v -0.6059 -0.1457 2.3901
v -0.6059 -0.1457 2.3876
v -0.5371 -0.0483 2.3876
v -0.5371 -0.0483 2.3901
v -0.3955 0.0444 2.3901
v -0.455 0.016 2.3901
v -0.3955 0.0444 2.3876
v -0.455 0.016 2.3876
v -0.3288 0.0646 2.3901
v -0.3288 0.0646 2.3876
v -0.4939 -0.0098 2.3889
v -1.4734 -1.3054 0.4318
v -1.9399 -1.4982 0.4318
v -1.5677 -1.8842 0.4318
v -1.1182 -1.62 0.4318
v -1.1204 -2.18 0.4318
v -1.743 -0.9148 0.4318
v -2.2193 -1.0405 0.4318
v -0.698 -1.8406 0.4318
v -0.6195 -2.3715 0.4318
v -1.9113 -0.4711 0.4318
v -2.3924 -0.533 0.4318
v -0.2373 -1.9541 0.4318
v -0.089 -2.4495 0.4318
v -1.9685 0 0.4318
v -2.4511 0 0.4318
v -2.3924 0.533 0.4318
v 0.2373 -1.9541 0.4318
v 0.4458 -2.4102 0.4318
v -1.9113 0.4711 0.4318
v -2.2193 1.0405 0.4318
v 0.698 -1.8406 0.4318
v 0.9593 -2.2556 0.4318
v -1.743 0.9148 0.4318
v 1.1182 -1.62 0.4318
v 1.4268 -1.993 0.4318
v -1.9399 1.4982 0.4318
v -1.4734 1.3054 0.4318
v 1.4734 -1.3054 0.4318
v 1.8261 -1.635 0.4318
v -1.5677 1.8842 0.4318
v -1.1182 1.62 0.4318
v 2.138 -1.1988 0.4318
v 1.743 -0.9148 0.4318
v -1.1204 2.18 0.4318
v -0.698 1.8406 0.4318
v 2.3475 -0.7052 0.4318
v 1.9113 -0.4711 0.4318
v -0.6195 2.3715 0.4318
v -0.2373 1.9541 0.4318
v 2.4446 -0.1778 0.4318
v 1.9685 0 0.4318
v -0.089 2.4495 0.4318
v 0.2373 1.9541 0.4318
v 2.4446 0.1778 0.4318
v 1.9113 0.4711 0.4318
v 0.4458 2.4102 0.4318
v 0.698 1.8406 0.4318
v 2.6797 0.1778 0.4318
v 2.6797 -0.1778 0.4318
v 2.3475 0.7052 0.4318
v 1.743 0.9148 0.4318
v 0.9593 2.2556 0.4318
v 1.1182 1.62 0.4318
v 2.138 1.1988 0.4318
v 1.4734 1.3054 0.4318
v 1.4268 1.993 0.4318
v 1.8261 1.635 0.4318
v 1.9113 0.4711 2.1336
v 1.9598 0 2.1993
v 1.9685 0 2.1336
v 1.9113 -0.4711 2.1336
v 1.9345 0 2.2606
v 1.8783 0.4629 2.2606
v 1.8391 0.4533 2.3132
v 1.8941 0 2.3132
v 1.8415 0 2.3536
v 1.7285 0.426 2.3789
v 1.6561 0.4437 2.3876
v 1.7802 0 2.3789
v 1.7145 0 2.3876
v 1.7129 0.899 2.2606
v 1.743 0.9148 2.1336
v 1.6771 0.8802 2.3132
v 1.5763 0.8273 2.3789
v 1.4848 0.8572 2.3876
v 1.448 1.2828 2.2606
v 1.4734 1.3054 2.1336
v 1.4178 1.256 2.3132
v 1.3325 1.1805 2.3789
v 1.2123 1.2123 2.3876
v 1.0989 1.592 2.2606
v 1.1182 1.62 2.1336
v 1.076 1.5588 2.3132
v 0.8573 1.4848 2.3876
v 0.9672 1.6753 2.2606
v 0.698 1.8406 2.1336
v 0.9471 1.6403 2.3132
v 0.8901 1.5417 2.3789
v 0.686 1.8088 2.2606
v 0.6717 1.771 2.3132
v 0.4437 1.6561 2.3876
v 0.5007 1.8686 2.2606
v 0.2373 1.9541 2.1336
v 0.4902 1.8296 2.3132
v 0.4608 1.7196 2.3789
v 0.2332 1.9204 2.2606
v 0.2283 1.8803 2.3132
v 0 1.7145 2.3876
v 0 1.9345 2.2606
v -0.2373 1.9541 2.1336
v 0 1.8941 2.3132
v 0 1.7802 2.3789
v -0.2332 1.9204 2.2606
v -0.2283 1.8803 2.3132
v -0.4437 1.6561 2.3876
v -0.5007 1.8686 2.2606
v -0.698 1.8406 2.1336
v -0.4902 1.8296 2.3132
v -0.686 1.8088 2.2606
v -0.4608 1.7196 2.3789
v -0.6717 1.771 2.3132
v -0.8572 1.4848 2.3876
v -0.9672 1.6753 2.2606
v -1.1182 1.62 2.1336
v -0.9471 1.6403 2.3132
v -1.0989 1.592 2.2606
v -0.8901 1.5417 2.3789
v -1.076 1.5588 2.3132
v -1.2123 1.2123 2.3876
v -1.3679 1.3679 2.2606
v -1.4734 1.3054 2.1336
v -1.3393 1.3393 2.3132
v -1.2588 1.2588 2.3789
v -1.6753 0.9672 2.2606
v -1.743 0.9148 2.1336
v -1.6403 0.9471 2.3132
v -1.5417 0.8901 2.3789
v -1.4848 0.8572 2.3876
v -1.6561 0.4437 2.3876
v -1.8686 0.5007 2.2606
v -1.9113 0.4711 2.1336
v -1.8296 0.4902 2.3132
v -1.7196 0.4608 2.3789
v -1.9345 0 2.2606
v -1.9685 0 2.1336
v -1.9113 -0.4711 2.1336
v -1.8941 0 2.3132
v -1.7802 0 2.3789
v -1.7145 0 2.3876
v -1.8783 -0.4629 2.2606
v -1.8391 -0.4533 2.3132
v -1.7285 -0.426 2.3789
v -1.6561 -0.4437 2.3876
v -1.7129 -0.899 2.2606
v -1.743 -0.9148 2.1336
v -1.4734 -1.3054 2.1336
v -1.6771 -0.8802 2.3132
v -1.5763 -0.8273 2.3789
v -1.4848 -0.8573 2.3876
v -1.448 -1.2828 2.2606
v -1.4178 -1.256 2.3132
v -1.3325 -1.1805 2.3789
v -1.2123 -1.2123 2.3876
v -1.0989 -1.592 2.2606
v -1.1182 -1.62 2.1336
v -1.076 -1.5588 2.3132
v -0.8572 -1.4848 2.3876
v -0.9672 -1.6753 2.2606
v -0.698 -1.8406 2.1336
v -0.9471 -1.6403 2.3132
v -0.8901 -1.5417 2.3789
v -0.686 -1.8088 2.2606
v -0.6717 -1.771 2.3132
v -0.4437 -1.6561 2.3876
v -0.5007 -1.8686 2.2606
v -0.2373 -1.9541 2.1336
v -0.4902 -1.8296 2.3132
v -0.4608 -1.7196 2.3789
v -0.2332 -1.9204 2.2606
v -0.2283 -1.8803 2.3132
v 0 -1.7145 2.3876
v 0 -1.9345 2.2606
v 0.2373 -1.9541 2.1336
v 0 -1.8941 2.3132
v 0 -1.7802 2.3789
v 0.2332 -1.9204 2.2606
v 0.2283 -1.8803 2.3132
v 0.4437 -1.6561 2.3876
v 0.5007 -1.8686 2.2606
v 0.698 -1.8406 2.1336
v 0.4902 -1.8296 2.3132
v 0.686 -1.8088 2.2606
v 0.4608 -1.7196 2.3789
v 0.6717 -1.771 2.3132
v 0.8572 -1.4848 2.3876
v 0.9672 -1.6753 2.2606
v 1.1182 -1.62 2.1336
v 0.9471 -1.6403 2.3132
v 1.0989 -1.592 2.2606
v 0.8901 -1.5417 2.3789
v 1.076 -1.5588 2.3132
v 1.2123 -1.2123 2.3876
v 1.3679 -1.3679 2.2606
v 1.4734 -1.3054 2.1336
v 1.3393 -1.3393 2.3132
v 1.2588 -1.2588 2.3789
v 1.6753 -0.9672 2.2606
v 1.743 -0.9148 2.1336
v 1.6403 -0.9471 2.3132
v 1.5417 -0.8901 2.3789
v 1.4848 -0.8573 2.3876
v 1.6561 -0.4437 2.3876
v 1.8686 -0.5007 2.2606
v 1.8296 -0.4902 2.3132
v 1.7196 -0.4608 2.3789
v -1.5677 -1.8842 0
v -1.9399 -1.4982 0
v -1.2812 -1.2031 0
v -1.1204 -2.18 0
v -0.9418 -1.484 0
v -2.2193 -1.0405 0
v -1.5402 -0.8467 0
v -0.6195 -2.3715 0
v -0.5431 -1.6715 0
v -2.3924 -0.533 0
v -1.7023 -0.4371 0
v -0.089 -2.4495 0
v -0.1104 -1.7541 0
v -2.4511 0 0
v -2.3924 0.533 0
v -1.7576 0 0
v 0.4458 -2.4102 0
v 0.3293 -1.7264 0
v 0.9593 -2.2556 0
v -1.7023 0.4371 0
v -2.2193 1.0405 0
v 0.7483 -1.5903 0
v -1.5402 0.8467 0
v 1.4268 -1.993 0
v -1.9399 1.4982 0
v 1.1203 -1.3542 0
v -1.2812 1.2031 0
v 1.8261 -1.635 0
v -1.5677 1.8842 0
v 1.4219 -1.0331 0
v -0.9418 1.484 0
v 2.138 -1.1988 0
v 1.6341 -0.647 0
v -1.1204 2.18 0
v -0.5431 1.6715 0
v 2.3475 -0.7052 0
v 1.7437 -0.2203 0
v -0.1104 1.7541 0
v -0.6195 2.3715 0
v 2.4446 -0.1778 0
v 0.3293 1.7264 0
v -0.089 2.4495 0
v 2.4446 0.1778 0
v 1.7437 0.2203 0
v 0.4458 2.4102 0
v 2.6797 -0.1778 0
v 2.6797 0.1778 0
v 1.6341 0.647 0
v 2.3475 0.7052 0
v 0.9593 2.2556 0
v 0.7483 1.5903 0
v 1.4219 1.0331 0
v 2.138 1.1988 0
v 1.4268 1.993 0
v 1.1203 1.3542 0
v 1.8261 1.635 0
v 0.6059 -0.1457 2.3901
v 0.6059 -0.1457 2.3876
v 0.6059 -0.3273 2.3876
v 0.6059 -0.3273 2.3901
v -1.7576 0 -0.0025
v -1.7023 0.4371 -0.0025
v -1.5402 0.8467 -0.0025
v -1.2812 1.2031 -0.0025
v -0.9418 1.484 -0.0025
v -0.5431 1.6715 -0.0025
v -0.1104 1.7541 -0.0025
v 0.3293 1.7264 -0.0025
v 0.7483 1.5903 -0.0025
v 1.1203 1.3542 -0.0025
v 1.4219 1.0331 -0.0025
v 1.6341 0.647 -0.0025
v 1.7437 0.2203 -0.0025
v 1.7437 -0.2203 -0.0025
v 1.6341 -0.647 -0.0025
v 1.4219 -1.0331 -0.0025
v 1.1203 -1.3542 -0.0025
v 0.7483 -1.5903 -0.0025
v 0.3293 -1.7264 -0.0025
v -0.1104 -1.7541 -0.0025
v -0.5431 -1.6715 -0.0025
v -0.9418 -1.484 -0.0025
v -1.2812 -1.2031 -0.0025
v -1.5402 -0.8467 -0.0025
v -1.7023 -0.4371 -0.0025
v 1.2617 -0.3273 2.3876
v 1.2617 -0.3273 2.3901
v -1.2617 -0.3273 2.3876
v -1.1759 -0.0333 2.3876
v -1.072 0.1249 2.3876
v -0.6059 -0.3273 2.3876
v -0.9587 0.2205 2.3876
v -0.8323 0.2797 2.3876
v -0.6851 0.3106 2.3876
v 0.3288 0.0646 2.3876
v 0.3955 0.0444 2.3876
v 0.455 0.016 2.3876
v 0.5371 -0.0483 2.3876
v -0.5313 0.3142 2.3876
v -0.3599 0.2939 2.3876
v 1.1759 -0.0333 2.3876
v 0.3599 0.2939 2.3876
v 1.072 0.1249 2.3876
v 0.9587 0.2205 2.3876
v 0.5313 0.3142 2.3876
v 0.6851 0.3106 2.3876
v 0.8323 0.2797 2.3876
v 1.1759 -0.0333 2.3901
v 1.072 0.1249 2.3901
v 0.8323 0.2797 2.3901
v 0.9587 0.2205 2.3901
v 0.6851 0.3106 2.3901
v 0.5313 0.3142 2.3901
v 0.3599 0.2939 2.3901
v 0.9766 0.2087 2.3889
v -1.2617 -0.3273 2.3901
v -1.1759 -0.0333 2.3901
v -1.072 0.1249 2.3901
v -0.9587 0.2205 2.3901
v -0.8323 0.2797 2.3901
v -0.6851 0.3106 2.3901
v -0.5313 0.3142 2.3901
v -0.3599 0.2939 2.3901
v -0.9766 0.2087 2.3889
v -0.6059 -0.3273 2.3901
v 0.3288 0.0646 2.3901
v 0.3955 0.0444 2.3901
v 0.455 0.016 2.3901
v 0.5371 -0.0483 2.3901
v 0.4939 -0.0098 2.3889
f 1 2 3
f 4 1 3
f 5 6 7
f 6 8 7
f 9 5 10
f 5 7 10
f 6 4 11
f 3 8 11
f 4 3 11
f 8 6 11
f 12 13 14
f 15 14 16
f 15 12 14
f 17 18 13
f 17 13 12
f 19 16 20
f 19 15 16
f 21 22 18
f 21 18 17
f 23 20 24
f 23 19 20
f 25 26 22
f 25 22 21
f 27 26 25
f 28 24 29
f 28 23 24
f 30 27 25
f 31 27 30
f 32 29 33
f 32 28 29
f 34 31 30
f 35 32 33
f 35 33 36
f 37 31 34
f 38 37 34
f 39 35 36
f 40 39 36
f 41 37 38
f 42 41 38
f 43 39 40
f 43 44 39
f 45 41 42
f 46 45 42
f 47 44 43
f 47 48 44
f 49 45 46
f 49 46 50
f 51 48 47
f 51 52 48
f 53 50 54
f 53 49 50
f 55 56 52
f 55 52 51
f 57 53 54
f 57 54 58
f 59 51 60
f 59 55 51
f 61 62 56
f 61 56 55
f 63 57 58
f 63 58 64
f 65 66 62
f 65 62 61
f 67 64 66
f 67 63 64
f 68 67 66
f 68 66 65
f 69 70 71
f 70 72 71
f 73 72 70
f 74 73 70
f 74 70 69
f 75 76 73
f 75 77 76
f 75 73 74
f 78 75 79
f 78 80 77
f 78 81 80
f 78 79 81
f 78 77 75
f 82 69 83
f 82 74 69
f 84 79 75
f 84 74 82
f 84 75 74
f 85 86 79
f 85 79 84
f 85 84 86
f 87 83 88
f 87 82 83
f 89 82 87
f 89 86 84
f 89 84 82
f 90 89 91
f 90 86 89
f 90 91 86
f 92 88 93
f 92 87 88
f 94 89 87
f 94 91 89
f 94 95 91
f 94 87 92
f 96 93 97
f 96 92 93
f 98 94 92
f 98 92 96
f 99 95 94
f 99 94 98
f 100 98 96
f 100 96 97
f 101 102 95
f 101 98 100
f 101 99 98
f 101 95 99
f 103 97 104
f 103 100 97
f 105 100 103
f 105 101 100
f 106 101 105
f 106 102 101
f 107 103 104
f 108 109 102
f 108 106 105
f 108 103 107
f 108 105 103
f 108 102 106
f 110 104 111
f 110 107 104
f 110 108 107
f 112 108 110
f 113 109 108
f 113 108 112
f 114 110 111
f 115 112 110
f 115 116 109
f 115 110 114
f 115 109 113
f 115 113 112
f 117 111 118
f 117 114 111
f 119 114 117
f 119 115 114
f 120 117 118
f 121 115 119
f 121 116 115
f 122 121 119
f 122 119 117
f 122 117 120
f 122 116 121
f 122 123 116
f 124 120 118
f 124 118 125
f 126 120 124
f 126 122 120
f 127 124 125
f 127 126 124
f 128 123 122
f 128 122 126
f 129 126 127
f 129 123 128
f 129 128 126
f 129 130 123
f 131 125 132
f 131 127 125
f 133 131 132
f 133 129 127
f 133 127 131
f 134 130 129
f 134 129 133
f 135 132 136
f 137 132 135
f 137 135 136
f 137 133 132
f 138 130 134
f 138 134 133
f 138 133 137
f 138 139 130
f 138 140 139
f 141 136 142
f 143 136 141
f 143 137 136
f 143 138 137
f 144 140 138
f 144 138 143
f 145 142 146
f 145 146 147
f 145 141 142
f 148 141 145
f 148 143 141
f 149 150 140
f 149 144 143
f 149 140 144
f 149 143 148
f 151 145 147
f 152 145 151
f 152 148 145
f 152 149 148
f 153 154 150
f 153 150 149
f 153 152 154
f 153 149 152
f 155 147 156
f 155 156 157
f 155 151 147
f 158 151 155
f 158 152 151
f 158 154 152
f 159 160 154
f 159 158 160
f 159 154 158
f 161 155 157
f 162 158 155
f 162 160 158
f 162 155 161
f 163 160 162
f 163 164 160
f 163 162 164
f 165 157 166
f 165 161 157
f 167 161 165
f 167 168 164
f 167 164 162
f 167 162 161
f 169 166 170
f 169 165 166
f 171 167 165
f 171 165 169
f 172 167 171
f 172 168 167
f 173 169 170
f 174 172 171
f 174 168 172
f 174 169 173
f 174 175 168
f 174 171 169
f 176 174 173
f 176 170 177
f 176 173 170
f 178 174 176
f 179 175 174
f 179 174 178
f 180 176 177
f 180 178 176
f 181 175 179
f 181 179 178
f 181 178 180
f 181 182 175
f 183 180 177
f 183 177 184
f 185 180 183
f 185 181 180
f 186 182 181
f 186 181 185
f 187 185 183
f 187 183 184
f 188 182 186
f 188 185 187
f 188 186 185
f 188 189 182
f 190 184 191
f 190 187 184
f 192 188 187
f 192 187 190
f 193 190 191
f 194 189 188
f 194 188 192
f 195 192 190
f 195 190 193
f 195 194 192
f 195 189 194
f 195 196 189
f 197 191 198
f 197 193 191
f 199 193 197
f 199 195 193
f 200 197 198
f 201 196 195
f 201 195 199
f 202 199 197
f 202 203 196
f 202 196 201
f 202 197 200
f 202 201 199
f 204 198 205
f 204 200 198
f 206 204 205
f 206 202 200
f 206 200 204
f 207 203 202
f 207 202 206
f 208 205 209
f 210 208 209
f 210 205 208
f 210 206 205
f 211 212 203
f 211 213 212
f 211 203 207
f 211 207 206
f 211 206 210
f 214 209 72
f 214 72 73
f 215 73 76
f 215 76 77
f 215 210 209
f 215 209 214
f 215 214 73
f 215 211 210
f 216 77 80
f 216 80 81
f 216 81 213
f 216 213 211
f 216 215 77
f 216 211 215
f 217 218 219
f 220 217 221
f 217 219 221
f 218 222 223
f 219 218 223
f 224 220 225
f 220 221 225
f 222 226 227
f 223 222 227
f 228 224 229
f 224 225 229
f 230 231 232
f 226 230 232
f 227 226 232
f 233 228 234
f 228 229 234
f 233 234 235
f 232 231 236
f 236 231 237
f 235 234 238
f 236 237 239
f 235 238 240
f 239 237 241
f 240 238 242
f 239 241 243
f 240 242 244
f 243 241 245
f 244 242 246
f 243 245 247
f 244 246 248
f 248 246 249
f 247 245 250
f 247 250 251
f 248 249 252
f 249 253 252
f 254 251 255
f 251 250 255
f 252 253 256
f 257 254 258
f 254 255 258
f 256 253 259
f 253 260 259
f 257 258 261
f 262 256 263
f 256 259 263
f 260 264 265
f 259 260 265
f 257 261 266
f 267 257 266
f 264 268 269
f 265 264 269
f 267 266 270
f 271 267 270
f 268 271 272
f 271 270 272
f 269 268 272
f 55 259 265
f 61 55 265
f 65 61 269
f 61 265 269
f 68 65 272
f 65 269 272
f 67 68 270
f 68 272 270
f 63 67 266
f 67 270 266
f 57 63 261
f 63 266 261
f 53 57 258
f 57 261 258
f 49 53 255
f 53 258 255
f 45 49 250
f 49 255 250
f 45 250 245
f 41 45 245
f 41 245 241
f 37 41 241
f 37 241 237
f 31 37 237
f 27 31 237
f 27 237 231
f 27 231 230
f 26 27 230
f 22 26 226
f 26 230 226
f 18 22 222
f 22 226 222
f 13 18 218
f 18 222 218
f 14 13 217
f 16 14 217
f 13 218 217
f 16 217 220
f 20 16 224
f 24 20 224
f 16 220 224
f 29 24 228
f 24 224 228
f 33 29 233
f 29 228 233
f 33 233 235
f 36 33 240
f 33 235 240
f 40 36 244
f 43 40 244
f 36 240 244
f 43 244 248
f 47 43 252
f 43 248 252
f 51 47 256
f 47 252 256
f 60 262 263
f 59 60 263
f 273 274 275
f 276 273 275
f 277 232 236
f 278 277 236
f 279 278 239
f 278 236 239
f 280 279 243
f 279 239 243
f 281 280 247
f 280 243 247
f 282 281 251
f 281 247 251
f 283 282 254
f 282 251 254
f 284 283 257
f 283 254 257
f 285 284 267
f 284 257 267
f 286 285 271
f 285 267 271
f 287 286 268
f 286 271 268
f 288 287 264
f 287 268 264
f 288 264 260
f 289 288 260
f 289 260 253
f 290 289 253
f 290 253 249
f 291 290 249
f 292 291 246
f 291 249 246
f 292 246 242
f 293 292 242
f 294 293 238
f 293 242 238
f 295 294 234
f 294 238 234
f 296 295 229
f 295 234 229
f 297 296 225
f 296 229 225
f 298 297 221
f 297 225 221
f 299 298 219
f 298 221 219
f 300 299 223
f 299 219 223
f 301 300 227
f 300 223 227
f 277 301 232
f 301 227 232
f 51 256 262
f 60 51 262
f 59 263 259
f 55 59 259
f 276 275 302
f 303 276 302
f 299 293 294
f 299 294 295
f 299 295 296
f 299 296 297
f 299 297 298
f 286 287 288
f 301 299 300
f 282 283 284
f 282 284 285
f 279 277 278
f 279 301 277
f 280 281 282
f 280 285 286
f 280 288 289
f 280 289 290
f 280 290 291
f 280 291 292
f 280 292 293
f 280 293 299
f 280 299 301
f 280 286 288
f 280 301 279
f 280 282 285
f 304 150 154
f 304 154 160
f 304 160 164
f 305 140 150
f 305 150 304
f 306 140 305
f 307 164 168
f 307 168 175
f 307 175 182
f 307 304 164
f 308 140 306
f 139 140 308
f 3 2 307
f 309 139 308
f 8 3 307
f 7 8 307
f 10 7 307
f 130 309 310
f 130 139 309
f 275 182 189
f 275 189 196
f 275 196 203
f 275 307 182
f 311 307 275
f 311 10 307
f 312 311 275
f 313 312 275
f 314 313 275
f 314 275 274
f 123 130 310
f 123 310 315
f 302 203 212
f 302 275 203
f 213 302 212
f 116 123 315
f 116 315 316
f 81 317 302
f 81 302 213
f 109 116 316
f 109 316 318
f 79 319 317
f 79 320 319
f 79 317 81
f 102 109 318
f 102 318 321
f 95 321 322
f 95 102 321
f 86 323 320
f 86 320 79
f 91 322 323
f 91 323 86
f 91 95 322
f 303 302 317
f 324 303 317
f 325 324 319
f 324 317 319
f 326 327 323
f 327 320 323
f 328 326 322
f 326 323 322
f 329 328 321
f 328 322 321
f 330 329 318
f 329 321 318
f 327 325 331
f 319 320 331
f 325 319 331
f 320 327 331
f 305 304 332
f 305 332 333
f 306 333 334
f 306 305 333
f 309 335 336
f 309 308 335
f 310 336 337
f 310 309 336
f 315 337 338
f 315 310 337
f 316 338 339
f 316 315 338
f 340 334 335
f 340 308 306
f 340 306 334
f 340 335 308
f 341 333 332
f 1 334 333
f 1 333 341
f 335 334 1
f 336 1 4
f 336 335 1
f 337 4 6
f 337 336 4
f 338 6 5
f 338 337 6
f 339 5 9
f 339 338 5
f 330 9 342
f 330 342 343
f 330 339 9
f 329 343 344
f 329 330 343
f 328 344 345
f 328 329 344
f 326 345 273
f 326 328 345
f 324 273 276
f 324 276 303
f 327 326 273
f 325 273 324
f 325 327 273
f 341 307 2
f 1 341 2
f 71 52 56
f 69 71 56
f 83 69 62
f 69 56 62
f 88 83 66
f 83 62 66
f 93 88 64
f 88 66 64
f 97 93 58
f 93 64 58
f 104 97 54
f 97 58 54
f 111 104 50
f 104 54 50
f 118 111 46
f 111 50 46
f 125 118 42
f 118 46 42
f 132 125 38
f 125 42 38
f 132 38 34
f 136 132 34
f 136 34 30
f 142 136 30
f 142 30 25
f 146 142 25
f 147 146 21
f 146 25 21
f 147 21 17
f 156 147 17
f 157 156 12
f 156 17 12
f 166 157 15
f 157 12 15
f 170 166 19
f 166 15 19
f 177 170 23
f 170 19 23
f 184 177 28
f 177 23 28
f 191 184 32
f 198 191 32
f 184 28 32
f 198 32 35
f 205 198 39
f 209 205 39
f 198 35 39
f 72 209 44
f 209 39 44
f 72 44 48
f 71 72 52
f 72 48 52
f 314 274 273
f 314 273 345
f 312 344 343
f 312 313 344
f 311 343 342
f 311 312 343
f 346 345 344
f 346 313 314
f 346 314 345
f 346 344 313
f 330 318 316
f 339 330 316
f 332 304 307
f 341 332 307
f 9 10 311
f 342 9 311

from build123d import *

# Parameters (mm, degrees)
BOSS_EXTRUDE1_DEPTH = 0.4318
SKETCH2_R           = 1.9685
BOSS_EXTRUDE2_DEPTH = 1.9558
SKETCH3_R           = 1.757566481
BOSS_EXTRUDE3_DEPTH = 0.00254
FILLET1_R           = 0.254
BOSS_EXTRUDE6_DEPTH = 0.00254


with BuildPart() as part:
    # Sketch1 → Boss-Extrude1 (new body)
    with BuildSketch(Plane.XY):
        with BuildLine():
            Line((2.6797, 0.1778), (2.4511, 0.1778))
            Line((2.4511, 0.1778), (2.44464279, 0.1778))
            ThreePointArc((2.44464279, 0.1778), (-2.4511, 0), (2.44464279, -0.1778))
            Line((2.44464279, -0.1778), (2.4511, -0.1778))
            Line((2.4511, -0.1778), (2.6797, -0.1778))
            Line((2.6797, -0.1778), (2.6797, 0.1778))
        make_face()
    extrude(amount=BOSS_EXTRUDE1_DEPTH)

    # Sketch2 → Boss-Extrude2 (add)
    with BuildSketch(Plane.XY.offset(0.4318)):
        Circle(SKETCH2_R)
    extrude(amount=BOSS_EXTRUDE2_DEPTH)

    # Sketch3 → Boss-Extrude3 (add)
    with BuildSketch(Plane(origin=(0, 0, 0), x_dir=(-1, 0, 0), z_dir=(0, 0, -1))):
        Circle(SKETCH3_R)
    extrude(amount=BOSS_EXTRUDE3_DEPTH)

    # Fillet1
    fillet1_edges = [part.edges().sort_by_distance(p)[0] for p in [
        (-1.9685, 0, 2.3876),
    ]]
    fillet(fillet1_edges, radius=FILLET1_R)

    # Sketch4 → Boss-Extrude6 (add)
    with BuildSketch(Plane.XY.offset(2.3876)):
        with BuildLine():
            Line((-1.261686098, -0.327272856), (-0.605919476, -0.327272856))
            Line((-0.605919476, -0.327272856), (-0.605919476, -0.145694879))
            add(Edge.make_bspline(
                [(-0.605919476, -0.145694879), (-0.520411043, 0.020884548), (-0.328774143, 0.064553305)],
                knots=[0, 0, 0, 1, 1, 1], degree=2))
            Line((-0.328774143, 0.064553305), (0.328774143, 0.064553305))
            add(Edge.make_bspline(
                [(0.605919476, -0.145694879), (0.520411043, 0.020884548), (0.328774143, 0.064553305)],
                knots=[0, 0, 0, 1, 1, 1], degree=2))
            Line((0.605919476, -0.145694879), (0.605919476, -0.327272856))
            Line((0.605919476, -0.327272856), (1.261686098, -0.327272856))
            add(Edge.make_bspline(
                [(1.261686098, -0.327272856), (1.14250793, 0.434027968), (0.359856965, 0.293914961)],
                knots=[0, 0, 0, 1, 1, 1], degree=2))
            Line((0.359856965, 0.293914961), (-0.359856965, 0.293914961))
            add(Edge.make_bspline(
                [(-1.261686098, -0.327272856), (-1.14250793, 0.434027968), (-0.359856965, 0.293914961)],
                knots=[0, 0, 0, 1, 1, 1], degree=2))
        make_face()
    extrude(amount=BOSS_EXTRUDE6_DEPTH)


solid = part.part
